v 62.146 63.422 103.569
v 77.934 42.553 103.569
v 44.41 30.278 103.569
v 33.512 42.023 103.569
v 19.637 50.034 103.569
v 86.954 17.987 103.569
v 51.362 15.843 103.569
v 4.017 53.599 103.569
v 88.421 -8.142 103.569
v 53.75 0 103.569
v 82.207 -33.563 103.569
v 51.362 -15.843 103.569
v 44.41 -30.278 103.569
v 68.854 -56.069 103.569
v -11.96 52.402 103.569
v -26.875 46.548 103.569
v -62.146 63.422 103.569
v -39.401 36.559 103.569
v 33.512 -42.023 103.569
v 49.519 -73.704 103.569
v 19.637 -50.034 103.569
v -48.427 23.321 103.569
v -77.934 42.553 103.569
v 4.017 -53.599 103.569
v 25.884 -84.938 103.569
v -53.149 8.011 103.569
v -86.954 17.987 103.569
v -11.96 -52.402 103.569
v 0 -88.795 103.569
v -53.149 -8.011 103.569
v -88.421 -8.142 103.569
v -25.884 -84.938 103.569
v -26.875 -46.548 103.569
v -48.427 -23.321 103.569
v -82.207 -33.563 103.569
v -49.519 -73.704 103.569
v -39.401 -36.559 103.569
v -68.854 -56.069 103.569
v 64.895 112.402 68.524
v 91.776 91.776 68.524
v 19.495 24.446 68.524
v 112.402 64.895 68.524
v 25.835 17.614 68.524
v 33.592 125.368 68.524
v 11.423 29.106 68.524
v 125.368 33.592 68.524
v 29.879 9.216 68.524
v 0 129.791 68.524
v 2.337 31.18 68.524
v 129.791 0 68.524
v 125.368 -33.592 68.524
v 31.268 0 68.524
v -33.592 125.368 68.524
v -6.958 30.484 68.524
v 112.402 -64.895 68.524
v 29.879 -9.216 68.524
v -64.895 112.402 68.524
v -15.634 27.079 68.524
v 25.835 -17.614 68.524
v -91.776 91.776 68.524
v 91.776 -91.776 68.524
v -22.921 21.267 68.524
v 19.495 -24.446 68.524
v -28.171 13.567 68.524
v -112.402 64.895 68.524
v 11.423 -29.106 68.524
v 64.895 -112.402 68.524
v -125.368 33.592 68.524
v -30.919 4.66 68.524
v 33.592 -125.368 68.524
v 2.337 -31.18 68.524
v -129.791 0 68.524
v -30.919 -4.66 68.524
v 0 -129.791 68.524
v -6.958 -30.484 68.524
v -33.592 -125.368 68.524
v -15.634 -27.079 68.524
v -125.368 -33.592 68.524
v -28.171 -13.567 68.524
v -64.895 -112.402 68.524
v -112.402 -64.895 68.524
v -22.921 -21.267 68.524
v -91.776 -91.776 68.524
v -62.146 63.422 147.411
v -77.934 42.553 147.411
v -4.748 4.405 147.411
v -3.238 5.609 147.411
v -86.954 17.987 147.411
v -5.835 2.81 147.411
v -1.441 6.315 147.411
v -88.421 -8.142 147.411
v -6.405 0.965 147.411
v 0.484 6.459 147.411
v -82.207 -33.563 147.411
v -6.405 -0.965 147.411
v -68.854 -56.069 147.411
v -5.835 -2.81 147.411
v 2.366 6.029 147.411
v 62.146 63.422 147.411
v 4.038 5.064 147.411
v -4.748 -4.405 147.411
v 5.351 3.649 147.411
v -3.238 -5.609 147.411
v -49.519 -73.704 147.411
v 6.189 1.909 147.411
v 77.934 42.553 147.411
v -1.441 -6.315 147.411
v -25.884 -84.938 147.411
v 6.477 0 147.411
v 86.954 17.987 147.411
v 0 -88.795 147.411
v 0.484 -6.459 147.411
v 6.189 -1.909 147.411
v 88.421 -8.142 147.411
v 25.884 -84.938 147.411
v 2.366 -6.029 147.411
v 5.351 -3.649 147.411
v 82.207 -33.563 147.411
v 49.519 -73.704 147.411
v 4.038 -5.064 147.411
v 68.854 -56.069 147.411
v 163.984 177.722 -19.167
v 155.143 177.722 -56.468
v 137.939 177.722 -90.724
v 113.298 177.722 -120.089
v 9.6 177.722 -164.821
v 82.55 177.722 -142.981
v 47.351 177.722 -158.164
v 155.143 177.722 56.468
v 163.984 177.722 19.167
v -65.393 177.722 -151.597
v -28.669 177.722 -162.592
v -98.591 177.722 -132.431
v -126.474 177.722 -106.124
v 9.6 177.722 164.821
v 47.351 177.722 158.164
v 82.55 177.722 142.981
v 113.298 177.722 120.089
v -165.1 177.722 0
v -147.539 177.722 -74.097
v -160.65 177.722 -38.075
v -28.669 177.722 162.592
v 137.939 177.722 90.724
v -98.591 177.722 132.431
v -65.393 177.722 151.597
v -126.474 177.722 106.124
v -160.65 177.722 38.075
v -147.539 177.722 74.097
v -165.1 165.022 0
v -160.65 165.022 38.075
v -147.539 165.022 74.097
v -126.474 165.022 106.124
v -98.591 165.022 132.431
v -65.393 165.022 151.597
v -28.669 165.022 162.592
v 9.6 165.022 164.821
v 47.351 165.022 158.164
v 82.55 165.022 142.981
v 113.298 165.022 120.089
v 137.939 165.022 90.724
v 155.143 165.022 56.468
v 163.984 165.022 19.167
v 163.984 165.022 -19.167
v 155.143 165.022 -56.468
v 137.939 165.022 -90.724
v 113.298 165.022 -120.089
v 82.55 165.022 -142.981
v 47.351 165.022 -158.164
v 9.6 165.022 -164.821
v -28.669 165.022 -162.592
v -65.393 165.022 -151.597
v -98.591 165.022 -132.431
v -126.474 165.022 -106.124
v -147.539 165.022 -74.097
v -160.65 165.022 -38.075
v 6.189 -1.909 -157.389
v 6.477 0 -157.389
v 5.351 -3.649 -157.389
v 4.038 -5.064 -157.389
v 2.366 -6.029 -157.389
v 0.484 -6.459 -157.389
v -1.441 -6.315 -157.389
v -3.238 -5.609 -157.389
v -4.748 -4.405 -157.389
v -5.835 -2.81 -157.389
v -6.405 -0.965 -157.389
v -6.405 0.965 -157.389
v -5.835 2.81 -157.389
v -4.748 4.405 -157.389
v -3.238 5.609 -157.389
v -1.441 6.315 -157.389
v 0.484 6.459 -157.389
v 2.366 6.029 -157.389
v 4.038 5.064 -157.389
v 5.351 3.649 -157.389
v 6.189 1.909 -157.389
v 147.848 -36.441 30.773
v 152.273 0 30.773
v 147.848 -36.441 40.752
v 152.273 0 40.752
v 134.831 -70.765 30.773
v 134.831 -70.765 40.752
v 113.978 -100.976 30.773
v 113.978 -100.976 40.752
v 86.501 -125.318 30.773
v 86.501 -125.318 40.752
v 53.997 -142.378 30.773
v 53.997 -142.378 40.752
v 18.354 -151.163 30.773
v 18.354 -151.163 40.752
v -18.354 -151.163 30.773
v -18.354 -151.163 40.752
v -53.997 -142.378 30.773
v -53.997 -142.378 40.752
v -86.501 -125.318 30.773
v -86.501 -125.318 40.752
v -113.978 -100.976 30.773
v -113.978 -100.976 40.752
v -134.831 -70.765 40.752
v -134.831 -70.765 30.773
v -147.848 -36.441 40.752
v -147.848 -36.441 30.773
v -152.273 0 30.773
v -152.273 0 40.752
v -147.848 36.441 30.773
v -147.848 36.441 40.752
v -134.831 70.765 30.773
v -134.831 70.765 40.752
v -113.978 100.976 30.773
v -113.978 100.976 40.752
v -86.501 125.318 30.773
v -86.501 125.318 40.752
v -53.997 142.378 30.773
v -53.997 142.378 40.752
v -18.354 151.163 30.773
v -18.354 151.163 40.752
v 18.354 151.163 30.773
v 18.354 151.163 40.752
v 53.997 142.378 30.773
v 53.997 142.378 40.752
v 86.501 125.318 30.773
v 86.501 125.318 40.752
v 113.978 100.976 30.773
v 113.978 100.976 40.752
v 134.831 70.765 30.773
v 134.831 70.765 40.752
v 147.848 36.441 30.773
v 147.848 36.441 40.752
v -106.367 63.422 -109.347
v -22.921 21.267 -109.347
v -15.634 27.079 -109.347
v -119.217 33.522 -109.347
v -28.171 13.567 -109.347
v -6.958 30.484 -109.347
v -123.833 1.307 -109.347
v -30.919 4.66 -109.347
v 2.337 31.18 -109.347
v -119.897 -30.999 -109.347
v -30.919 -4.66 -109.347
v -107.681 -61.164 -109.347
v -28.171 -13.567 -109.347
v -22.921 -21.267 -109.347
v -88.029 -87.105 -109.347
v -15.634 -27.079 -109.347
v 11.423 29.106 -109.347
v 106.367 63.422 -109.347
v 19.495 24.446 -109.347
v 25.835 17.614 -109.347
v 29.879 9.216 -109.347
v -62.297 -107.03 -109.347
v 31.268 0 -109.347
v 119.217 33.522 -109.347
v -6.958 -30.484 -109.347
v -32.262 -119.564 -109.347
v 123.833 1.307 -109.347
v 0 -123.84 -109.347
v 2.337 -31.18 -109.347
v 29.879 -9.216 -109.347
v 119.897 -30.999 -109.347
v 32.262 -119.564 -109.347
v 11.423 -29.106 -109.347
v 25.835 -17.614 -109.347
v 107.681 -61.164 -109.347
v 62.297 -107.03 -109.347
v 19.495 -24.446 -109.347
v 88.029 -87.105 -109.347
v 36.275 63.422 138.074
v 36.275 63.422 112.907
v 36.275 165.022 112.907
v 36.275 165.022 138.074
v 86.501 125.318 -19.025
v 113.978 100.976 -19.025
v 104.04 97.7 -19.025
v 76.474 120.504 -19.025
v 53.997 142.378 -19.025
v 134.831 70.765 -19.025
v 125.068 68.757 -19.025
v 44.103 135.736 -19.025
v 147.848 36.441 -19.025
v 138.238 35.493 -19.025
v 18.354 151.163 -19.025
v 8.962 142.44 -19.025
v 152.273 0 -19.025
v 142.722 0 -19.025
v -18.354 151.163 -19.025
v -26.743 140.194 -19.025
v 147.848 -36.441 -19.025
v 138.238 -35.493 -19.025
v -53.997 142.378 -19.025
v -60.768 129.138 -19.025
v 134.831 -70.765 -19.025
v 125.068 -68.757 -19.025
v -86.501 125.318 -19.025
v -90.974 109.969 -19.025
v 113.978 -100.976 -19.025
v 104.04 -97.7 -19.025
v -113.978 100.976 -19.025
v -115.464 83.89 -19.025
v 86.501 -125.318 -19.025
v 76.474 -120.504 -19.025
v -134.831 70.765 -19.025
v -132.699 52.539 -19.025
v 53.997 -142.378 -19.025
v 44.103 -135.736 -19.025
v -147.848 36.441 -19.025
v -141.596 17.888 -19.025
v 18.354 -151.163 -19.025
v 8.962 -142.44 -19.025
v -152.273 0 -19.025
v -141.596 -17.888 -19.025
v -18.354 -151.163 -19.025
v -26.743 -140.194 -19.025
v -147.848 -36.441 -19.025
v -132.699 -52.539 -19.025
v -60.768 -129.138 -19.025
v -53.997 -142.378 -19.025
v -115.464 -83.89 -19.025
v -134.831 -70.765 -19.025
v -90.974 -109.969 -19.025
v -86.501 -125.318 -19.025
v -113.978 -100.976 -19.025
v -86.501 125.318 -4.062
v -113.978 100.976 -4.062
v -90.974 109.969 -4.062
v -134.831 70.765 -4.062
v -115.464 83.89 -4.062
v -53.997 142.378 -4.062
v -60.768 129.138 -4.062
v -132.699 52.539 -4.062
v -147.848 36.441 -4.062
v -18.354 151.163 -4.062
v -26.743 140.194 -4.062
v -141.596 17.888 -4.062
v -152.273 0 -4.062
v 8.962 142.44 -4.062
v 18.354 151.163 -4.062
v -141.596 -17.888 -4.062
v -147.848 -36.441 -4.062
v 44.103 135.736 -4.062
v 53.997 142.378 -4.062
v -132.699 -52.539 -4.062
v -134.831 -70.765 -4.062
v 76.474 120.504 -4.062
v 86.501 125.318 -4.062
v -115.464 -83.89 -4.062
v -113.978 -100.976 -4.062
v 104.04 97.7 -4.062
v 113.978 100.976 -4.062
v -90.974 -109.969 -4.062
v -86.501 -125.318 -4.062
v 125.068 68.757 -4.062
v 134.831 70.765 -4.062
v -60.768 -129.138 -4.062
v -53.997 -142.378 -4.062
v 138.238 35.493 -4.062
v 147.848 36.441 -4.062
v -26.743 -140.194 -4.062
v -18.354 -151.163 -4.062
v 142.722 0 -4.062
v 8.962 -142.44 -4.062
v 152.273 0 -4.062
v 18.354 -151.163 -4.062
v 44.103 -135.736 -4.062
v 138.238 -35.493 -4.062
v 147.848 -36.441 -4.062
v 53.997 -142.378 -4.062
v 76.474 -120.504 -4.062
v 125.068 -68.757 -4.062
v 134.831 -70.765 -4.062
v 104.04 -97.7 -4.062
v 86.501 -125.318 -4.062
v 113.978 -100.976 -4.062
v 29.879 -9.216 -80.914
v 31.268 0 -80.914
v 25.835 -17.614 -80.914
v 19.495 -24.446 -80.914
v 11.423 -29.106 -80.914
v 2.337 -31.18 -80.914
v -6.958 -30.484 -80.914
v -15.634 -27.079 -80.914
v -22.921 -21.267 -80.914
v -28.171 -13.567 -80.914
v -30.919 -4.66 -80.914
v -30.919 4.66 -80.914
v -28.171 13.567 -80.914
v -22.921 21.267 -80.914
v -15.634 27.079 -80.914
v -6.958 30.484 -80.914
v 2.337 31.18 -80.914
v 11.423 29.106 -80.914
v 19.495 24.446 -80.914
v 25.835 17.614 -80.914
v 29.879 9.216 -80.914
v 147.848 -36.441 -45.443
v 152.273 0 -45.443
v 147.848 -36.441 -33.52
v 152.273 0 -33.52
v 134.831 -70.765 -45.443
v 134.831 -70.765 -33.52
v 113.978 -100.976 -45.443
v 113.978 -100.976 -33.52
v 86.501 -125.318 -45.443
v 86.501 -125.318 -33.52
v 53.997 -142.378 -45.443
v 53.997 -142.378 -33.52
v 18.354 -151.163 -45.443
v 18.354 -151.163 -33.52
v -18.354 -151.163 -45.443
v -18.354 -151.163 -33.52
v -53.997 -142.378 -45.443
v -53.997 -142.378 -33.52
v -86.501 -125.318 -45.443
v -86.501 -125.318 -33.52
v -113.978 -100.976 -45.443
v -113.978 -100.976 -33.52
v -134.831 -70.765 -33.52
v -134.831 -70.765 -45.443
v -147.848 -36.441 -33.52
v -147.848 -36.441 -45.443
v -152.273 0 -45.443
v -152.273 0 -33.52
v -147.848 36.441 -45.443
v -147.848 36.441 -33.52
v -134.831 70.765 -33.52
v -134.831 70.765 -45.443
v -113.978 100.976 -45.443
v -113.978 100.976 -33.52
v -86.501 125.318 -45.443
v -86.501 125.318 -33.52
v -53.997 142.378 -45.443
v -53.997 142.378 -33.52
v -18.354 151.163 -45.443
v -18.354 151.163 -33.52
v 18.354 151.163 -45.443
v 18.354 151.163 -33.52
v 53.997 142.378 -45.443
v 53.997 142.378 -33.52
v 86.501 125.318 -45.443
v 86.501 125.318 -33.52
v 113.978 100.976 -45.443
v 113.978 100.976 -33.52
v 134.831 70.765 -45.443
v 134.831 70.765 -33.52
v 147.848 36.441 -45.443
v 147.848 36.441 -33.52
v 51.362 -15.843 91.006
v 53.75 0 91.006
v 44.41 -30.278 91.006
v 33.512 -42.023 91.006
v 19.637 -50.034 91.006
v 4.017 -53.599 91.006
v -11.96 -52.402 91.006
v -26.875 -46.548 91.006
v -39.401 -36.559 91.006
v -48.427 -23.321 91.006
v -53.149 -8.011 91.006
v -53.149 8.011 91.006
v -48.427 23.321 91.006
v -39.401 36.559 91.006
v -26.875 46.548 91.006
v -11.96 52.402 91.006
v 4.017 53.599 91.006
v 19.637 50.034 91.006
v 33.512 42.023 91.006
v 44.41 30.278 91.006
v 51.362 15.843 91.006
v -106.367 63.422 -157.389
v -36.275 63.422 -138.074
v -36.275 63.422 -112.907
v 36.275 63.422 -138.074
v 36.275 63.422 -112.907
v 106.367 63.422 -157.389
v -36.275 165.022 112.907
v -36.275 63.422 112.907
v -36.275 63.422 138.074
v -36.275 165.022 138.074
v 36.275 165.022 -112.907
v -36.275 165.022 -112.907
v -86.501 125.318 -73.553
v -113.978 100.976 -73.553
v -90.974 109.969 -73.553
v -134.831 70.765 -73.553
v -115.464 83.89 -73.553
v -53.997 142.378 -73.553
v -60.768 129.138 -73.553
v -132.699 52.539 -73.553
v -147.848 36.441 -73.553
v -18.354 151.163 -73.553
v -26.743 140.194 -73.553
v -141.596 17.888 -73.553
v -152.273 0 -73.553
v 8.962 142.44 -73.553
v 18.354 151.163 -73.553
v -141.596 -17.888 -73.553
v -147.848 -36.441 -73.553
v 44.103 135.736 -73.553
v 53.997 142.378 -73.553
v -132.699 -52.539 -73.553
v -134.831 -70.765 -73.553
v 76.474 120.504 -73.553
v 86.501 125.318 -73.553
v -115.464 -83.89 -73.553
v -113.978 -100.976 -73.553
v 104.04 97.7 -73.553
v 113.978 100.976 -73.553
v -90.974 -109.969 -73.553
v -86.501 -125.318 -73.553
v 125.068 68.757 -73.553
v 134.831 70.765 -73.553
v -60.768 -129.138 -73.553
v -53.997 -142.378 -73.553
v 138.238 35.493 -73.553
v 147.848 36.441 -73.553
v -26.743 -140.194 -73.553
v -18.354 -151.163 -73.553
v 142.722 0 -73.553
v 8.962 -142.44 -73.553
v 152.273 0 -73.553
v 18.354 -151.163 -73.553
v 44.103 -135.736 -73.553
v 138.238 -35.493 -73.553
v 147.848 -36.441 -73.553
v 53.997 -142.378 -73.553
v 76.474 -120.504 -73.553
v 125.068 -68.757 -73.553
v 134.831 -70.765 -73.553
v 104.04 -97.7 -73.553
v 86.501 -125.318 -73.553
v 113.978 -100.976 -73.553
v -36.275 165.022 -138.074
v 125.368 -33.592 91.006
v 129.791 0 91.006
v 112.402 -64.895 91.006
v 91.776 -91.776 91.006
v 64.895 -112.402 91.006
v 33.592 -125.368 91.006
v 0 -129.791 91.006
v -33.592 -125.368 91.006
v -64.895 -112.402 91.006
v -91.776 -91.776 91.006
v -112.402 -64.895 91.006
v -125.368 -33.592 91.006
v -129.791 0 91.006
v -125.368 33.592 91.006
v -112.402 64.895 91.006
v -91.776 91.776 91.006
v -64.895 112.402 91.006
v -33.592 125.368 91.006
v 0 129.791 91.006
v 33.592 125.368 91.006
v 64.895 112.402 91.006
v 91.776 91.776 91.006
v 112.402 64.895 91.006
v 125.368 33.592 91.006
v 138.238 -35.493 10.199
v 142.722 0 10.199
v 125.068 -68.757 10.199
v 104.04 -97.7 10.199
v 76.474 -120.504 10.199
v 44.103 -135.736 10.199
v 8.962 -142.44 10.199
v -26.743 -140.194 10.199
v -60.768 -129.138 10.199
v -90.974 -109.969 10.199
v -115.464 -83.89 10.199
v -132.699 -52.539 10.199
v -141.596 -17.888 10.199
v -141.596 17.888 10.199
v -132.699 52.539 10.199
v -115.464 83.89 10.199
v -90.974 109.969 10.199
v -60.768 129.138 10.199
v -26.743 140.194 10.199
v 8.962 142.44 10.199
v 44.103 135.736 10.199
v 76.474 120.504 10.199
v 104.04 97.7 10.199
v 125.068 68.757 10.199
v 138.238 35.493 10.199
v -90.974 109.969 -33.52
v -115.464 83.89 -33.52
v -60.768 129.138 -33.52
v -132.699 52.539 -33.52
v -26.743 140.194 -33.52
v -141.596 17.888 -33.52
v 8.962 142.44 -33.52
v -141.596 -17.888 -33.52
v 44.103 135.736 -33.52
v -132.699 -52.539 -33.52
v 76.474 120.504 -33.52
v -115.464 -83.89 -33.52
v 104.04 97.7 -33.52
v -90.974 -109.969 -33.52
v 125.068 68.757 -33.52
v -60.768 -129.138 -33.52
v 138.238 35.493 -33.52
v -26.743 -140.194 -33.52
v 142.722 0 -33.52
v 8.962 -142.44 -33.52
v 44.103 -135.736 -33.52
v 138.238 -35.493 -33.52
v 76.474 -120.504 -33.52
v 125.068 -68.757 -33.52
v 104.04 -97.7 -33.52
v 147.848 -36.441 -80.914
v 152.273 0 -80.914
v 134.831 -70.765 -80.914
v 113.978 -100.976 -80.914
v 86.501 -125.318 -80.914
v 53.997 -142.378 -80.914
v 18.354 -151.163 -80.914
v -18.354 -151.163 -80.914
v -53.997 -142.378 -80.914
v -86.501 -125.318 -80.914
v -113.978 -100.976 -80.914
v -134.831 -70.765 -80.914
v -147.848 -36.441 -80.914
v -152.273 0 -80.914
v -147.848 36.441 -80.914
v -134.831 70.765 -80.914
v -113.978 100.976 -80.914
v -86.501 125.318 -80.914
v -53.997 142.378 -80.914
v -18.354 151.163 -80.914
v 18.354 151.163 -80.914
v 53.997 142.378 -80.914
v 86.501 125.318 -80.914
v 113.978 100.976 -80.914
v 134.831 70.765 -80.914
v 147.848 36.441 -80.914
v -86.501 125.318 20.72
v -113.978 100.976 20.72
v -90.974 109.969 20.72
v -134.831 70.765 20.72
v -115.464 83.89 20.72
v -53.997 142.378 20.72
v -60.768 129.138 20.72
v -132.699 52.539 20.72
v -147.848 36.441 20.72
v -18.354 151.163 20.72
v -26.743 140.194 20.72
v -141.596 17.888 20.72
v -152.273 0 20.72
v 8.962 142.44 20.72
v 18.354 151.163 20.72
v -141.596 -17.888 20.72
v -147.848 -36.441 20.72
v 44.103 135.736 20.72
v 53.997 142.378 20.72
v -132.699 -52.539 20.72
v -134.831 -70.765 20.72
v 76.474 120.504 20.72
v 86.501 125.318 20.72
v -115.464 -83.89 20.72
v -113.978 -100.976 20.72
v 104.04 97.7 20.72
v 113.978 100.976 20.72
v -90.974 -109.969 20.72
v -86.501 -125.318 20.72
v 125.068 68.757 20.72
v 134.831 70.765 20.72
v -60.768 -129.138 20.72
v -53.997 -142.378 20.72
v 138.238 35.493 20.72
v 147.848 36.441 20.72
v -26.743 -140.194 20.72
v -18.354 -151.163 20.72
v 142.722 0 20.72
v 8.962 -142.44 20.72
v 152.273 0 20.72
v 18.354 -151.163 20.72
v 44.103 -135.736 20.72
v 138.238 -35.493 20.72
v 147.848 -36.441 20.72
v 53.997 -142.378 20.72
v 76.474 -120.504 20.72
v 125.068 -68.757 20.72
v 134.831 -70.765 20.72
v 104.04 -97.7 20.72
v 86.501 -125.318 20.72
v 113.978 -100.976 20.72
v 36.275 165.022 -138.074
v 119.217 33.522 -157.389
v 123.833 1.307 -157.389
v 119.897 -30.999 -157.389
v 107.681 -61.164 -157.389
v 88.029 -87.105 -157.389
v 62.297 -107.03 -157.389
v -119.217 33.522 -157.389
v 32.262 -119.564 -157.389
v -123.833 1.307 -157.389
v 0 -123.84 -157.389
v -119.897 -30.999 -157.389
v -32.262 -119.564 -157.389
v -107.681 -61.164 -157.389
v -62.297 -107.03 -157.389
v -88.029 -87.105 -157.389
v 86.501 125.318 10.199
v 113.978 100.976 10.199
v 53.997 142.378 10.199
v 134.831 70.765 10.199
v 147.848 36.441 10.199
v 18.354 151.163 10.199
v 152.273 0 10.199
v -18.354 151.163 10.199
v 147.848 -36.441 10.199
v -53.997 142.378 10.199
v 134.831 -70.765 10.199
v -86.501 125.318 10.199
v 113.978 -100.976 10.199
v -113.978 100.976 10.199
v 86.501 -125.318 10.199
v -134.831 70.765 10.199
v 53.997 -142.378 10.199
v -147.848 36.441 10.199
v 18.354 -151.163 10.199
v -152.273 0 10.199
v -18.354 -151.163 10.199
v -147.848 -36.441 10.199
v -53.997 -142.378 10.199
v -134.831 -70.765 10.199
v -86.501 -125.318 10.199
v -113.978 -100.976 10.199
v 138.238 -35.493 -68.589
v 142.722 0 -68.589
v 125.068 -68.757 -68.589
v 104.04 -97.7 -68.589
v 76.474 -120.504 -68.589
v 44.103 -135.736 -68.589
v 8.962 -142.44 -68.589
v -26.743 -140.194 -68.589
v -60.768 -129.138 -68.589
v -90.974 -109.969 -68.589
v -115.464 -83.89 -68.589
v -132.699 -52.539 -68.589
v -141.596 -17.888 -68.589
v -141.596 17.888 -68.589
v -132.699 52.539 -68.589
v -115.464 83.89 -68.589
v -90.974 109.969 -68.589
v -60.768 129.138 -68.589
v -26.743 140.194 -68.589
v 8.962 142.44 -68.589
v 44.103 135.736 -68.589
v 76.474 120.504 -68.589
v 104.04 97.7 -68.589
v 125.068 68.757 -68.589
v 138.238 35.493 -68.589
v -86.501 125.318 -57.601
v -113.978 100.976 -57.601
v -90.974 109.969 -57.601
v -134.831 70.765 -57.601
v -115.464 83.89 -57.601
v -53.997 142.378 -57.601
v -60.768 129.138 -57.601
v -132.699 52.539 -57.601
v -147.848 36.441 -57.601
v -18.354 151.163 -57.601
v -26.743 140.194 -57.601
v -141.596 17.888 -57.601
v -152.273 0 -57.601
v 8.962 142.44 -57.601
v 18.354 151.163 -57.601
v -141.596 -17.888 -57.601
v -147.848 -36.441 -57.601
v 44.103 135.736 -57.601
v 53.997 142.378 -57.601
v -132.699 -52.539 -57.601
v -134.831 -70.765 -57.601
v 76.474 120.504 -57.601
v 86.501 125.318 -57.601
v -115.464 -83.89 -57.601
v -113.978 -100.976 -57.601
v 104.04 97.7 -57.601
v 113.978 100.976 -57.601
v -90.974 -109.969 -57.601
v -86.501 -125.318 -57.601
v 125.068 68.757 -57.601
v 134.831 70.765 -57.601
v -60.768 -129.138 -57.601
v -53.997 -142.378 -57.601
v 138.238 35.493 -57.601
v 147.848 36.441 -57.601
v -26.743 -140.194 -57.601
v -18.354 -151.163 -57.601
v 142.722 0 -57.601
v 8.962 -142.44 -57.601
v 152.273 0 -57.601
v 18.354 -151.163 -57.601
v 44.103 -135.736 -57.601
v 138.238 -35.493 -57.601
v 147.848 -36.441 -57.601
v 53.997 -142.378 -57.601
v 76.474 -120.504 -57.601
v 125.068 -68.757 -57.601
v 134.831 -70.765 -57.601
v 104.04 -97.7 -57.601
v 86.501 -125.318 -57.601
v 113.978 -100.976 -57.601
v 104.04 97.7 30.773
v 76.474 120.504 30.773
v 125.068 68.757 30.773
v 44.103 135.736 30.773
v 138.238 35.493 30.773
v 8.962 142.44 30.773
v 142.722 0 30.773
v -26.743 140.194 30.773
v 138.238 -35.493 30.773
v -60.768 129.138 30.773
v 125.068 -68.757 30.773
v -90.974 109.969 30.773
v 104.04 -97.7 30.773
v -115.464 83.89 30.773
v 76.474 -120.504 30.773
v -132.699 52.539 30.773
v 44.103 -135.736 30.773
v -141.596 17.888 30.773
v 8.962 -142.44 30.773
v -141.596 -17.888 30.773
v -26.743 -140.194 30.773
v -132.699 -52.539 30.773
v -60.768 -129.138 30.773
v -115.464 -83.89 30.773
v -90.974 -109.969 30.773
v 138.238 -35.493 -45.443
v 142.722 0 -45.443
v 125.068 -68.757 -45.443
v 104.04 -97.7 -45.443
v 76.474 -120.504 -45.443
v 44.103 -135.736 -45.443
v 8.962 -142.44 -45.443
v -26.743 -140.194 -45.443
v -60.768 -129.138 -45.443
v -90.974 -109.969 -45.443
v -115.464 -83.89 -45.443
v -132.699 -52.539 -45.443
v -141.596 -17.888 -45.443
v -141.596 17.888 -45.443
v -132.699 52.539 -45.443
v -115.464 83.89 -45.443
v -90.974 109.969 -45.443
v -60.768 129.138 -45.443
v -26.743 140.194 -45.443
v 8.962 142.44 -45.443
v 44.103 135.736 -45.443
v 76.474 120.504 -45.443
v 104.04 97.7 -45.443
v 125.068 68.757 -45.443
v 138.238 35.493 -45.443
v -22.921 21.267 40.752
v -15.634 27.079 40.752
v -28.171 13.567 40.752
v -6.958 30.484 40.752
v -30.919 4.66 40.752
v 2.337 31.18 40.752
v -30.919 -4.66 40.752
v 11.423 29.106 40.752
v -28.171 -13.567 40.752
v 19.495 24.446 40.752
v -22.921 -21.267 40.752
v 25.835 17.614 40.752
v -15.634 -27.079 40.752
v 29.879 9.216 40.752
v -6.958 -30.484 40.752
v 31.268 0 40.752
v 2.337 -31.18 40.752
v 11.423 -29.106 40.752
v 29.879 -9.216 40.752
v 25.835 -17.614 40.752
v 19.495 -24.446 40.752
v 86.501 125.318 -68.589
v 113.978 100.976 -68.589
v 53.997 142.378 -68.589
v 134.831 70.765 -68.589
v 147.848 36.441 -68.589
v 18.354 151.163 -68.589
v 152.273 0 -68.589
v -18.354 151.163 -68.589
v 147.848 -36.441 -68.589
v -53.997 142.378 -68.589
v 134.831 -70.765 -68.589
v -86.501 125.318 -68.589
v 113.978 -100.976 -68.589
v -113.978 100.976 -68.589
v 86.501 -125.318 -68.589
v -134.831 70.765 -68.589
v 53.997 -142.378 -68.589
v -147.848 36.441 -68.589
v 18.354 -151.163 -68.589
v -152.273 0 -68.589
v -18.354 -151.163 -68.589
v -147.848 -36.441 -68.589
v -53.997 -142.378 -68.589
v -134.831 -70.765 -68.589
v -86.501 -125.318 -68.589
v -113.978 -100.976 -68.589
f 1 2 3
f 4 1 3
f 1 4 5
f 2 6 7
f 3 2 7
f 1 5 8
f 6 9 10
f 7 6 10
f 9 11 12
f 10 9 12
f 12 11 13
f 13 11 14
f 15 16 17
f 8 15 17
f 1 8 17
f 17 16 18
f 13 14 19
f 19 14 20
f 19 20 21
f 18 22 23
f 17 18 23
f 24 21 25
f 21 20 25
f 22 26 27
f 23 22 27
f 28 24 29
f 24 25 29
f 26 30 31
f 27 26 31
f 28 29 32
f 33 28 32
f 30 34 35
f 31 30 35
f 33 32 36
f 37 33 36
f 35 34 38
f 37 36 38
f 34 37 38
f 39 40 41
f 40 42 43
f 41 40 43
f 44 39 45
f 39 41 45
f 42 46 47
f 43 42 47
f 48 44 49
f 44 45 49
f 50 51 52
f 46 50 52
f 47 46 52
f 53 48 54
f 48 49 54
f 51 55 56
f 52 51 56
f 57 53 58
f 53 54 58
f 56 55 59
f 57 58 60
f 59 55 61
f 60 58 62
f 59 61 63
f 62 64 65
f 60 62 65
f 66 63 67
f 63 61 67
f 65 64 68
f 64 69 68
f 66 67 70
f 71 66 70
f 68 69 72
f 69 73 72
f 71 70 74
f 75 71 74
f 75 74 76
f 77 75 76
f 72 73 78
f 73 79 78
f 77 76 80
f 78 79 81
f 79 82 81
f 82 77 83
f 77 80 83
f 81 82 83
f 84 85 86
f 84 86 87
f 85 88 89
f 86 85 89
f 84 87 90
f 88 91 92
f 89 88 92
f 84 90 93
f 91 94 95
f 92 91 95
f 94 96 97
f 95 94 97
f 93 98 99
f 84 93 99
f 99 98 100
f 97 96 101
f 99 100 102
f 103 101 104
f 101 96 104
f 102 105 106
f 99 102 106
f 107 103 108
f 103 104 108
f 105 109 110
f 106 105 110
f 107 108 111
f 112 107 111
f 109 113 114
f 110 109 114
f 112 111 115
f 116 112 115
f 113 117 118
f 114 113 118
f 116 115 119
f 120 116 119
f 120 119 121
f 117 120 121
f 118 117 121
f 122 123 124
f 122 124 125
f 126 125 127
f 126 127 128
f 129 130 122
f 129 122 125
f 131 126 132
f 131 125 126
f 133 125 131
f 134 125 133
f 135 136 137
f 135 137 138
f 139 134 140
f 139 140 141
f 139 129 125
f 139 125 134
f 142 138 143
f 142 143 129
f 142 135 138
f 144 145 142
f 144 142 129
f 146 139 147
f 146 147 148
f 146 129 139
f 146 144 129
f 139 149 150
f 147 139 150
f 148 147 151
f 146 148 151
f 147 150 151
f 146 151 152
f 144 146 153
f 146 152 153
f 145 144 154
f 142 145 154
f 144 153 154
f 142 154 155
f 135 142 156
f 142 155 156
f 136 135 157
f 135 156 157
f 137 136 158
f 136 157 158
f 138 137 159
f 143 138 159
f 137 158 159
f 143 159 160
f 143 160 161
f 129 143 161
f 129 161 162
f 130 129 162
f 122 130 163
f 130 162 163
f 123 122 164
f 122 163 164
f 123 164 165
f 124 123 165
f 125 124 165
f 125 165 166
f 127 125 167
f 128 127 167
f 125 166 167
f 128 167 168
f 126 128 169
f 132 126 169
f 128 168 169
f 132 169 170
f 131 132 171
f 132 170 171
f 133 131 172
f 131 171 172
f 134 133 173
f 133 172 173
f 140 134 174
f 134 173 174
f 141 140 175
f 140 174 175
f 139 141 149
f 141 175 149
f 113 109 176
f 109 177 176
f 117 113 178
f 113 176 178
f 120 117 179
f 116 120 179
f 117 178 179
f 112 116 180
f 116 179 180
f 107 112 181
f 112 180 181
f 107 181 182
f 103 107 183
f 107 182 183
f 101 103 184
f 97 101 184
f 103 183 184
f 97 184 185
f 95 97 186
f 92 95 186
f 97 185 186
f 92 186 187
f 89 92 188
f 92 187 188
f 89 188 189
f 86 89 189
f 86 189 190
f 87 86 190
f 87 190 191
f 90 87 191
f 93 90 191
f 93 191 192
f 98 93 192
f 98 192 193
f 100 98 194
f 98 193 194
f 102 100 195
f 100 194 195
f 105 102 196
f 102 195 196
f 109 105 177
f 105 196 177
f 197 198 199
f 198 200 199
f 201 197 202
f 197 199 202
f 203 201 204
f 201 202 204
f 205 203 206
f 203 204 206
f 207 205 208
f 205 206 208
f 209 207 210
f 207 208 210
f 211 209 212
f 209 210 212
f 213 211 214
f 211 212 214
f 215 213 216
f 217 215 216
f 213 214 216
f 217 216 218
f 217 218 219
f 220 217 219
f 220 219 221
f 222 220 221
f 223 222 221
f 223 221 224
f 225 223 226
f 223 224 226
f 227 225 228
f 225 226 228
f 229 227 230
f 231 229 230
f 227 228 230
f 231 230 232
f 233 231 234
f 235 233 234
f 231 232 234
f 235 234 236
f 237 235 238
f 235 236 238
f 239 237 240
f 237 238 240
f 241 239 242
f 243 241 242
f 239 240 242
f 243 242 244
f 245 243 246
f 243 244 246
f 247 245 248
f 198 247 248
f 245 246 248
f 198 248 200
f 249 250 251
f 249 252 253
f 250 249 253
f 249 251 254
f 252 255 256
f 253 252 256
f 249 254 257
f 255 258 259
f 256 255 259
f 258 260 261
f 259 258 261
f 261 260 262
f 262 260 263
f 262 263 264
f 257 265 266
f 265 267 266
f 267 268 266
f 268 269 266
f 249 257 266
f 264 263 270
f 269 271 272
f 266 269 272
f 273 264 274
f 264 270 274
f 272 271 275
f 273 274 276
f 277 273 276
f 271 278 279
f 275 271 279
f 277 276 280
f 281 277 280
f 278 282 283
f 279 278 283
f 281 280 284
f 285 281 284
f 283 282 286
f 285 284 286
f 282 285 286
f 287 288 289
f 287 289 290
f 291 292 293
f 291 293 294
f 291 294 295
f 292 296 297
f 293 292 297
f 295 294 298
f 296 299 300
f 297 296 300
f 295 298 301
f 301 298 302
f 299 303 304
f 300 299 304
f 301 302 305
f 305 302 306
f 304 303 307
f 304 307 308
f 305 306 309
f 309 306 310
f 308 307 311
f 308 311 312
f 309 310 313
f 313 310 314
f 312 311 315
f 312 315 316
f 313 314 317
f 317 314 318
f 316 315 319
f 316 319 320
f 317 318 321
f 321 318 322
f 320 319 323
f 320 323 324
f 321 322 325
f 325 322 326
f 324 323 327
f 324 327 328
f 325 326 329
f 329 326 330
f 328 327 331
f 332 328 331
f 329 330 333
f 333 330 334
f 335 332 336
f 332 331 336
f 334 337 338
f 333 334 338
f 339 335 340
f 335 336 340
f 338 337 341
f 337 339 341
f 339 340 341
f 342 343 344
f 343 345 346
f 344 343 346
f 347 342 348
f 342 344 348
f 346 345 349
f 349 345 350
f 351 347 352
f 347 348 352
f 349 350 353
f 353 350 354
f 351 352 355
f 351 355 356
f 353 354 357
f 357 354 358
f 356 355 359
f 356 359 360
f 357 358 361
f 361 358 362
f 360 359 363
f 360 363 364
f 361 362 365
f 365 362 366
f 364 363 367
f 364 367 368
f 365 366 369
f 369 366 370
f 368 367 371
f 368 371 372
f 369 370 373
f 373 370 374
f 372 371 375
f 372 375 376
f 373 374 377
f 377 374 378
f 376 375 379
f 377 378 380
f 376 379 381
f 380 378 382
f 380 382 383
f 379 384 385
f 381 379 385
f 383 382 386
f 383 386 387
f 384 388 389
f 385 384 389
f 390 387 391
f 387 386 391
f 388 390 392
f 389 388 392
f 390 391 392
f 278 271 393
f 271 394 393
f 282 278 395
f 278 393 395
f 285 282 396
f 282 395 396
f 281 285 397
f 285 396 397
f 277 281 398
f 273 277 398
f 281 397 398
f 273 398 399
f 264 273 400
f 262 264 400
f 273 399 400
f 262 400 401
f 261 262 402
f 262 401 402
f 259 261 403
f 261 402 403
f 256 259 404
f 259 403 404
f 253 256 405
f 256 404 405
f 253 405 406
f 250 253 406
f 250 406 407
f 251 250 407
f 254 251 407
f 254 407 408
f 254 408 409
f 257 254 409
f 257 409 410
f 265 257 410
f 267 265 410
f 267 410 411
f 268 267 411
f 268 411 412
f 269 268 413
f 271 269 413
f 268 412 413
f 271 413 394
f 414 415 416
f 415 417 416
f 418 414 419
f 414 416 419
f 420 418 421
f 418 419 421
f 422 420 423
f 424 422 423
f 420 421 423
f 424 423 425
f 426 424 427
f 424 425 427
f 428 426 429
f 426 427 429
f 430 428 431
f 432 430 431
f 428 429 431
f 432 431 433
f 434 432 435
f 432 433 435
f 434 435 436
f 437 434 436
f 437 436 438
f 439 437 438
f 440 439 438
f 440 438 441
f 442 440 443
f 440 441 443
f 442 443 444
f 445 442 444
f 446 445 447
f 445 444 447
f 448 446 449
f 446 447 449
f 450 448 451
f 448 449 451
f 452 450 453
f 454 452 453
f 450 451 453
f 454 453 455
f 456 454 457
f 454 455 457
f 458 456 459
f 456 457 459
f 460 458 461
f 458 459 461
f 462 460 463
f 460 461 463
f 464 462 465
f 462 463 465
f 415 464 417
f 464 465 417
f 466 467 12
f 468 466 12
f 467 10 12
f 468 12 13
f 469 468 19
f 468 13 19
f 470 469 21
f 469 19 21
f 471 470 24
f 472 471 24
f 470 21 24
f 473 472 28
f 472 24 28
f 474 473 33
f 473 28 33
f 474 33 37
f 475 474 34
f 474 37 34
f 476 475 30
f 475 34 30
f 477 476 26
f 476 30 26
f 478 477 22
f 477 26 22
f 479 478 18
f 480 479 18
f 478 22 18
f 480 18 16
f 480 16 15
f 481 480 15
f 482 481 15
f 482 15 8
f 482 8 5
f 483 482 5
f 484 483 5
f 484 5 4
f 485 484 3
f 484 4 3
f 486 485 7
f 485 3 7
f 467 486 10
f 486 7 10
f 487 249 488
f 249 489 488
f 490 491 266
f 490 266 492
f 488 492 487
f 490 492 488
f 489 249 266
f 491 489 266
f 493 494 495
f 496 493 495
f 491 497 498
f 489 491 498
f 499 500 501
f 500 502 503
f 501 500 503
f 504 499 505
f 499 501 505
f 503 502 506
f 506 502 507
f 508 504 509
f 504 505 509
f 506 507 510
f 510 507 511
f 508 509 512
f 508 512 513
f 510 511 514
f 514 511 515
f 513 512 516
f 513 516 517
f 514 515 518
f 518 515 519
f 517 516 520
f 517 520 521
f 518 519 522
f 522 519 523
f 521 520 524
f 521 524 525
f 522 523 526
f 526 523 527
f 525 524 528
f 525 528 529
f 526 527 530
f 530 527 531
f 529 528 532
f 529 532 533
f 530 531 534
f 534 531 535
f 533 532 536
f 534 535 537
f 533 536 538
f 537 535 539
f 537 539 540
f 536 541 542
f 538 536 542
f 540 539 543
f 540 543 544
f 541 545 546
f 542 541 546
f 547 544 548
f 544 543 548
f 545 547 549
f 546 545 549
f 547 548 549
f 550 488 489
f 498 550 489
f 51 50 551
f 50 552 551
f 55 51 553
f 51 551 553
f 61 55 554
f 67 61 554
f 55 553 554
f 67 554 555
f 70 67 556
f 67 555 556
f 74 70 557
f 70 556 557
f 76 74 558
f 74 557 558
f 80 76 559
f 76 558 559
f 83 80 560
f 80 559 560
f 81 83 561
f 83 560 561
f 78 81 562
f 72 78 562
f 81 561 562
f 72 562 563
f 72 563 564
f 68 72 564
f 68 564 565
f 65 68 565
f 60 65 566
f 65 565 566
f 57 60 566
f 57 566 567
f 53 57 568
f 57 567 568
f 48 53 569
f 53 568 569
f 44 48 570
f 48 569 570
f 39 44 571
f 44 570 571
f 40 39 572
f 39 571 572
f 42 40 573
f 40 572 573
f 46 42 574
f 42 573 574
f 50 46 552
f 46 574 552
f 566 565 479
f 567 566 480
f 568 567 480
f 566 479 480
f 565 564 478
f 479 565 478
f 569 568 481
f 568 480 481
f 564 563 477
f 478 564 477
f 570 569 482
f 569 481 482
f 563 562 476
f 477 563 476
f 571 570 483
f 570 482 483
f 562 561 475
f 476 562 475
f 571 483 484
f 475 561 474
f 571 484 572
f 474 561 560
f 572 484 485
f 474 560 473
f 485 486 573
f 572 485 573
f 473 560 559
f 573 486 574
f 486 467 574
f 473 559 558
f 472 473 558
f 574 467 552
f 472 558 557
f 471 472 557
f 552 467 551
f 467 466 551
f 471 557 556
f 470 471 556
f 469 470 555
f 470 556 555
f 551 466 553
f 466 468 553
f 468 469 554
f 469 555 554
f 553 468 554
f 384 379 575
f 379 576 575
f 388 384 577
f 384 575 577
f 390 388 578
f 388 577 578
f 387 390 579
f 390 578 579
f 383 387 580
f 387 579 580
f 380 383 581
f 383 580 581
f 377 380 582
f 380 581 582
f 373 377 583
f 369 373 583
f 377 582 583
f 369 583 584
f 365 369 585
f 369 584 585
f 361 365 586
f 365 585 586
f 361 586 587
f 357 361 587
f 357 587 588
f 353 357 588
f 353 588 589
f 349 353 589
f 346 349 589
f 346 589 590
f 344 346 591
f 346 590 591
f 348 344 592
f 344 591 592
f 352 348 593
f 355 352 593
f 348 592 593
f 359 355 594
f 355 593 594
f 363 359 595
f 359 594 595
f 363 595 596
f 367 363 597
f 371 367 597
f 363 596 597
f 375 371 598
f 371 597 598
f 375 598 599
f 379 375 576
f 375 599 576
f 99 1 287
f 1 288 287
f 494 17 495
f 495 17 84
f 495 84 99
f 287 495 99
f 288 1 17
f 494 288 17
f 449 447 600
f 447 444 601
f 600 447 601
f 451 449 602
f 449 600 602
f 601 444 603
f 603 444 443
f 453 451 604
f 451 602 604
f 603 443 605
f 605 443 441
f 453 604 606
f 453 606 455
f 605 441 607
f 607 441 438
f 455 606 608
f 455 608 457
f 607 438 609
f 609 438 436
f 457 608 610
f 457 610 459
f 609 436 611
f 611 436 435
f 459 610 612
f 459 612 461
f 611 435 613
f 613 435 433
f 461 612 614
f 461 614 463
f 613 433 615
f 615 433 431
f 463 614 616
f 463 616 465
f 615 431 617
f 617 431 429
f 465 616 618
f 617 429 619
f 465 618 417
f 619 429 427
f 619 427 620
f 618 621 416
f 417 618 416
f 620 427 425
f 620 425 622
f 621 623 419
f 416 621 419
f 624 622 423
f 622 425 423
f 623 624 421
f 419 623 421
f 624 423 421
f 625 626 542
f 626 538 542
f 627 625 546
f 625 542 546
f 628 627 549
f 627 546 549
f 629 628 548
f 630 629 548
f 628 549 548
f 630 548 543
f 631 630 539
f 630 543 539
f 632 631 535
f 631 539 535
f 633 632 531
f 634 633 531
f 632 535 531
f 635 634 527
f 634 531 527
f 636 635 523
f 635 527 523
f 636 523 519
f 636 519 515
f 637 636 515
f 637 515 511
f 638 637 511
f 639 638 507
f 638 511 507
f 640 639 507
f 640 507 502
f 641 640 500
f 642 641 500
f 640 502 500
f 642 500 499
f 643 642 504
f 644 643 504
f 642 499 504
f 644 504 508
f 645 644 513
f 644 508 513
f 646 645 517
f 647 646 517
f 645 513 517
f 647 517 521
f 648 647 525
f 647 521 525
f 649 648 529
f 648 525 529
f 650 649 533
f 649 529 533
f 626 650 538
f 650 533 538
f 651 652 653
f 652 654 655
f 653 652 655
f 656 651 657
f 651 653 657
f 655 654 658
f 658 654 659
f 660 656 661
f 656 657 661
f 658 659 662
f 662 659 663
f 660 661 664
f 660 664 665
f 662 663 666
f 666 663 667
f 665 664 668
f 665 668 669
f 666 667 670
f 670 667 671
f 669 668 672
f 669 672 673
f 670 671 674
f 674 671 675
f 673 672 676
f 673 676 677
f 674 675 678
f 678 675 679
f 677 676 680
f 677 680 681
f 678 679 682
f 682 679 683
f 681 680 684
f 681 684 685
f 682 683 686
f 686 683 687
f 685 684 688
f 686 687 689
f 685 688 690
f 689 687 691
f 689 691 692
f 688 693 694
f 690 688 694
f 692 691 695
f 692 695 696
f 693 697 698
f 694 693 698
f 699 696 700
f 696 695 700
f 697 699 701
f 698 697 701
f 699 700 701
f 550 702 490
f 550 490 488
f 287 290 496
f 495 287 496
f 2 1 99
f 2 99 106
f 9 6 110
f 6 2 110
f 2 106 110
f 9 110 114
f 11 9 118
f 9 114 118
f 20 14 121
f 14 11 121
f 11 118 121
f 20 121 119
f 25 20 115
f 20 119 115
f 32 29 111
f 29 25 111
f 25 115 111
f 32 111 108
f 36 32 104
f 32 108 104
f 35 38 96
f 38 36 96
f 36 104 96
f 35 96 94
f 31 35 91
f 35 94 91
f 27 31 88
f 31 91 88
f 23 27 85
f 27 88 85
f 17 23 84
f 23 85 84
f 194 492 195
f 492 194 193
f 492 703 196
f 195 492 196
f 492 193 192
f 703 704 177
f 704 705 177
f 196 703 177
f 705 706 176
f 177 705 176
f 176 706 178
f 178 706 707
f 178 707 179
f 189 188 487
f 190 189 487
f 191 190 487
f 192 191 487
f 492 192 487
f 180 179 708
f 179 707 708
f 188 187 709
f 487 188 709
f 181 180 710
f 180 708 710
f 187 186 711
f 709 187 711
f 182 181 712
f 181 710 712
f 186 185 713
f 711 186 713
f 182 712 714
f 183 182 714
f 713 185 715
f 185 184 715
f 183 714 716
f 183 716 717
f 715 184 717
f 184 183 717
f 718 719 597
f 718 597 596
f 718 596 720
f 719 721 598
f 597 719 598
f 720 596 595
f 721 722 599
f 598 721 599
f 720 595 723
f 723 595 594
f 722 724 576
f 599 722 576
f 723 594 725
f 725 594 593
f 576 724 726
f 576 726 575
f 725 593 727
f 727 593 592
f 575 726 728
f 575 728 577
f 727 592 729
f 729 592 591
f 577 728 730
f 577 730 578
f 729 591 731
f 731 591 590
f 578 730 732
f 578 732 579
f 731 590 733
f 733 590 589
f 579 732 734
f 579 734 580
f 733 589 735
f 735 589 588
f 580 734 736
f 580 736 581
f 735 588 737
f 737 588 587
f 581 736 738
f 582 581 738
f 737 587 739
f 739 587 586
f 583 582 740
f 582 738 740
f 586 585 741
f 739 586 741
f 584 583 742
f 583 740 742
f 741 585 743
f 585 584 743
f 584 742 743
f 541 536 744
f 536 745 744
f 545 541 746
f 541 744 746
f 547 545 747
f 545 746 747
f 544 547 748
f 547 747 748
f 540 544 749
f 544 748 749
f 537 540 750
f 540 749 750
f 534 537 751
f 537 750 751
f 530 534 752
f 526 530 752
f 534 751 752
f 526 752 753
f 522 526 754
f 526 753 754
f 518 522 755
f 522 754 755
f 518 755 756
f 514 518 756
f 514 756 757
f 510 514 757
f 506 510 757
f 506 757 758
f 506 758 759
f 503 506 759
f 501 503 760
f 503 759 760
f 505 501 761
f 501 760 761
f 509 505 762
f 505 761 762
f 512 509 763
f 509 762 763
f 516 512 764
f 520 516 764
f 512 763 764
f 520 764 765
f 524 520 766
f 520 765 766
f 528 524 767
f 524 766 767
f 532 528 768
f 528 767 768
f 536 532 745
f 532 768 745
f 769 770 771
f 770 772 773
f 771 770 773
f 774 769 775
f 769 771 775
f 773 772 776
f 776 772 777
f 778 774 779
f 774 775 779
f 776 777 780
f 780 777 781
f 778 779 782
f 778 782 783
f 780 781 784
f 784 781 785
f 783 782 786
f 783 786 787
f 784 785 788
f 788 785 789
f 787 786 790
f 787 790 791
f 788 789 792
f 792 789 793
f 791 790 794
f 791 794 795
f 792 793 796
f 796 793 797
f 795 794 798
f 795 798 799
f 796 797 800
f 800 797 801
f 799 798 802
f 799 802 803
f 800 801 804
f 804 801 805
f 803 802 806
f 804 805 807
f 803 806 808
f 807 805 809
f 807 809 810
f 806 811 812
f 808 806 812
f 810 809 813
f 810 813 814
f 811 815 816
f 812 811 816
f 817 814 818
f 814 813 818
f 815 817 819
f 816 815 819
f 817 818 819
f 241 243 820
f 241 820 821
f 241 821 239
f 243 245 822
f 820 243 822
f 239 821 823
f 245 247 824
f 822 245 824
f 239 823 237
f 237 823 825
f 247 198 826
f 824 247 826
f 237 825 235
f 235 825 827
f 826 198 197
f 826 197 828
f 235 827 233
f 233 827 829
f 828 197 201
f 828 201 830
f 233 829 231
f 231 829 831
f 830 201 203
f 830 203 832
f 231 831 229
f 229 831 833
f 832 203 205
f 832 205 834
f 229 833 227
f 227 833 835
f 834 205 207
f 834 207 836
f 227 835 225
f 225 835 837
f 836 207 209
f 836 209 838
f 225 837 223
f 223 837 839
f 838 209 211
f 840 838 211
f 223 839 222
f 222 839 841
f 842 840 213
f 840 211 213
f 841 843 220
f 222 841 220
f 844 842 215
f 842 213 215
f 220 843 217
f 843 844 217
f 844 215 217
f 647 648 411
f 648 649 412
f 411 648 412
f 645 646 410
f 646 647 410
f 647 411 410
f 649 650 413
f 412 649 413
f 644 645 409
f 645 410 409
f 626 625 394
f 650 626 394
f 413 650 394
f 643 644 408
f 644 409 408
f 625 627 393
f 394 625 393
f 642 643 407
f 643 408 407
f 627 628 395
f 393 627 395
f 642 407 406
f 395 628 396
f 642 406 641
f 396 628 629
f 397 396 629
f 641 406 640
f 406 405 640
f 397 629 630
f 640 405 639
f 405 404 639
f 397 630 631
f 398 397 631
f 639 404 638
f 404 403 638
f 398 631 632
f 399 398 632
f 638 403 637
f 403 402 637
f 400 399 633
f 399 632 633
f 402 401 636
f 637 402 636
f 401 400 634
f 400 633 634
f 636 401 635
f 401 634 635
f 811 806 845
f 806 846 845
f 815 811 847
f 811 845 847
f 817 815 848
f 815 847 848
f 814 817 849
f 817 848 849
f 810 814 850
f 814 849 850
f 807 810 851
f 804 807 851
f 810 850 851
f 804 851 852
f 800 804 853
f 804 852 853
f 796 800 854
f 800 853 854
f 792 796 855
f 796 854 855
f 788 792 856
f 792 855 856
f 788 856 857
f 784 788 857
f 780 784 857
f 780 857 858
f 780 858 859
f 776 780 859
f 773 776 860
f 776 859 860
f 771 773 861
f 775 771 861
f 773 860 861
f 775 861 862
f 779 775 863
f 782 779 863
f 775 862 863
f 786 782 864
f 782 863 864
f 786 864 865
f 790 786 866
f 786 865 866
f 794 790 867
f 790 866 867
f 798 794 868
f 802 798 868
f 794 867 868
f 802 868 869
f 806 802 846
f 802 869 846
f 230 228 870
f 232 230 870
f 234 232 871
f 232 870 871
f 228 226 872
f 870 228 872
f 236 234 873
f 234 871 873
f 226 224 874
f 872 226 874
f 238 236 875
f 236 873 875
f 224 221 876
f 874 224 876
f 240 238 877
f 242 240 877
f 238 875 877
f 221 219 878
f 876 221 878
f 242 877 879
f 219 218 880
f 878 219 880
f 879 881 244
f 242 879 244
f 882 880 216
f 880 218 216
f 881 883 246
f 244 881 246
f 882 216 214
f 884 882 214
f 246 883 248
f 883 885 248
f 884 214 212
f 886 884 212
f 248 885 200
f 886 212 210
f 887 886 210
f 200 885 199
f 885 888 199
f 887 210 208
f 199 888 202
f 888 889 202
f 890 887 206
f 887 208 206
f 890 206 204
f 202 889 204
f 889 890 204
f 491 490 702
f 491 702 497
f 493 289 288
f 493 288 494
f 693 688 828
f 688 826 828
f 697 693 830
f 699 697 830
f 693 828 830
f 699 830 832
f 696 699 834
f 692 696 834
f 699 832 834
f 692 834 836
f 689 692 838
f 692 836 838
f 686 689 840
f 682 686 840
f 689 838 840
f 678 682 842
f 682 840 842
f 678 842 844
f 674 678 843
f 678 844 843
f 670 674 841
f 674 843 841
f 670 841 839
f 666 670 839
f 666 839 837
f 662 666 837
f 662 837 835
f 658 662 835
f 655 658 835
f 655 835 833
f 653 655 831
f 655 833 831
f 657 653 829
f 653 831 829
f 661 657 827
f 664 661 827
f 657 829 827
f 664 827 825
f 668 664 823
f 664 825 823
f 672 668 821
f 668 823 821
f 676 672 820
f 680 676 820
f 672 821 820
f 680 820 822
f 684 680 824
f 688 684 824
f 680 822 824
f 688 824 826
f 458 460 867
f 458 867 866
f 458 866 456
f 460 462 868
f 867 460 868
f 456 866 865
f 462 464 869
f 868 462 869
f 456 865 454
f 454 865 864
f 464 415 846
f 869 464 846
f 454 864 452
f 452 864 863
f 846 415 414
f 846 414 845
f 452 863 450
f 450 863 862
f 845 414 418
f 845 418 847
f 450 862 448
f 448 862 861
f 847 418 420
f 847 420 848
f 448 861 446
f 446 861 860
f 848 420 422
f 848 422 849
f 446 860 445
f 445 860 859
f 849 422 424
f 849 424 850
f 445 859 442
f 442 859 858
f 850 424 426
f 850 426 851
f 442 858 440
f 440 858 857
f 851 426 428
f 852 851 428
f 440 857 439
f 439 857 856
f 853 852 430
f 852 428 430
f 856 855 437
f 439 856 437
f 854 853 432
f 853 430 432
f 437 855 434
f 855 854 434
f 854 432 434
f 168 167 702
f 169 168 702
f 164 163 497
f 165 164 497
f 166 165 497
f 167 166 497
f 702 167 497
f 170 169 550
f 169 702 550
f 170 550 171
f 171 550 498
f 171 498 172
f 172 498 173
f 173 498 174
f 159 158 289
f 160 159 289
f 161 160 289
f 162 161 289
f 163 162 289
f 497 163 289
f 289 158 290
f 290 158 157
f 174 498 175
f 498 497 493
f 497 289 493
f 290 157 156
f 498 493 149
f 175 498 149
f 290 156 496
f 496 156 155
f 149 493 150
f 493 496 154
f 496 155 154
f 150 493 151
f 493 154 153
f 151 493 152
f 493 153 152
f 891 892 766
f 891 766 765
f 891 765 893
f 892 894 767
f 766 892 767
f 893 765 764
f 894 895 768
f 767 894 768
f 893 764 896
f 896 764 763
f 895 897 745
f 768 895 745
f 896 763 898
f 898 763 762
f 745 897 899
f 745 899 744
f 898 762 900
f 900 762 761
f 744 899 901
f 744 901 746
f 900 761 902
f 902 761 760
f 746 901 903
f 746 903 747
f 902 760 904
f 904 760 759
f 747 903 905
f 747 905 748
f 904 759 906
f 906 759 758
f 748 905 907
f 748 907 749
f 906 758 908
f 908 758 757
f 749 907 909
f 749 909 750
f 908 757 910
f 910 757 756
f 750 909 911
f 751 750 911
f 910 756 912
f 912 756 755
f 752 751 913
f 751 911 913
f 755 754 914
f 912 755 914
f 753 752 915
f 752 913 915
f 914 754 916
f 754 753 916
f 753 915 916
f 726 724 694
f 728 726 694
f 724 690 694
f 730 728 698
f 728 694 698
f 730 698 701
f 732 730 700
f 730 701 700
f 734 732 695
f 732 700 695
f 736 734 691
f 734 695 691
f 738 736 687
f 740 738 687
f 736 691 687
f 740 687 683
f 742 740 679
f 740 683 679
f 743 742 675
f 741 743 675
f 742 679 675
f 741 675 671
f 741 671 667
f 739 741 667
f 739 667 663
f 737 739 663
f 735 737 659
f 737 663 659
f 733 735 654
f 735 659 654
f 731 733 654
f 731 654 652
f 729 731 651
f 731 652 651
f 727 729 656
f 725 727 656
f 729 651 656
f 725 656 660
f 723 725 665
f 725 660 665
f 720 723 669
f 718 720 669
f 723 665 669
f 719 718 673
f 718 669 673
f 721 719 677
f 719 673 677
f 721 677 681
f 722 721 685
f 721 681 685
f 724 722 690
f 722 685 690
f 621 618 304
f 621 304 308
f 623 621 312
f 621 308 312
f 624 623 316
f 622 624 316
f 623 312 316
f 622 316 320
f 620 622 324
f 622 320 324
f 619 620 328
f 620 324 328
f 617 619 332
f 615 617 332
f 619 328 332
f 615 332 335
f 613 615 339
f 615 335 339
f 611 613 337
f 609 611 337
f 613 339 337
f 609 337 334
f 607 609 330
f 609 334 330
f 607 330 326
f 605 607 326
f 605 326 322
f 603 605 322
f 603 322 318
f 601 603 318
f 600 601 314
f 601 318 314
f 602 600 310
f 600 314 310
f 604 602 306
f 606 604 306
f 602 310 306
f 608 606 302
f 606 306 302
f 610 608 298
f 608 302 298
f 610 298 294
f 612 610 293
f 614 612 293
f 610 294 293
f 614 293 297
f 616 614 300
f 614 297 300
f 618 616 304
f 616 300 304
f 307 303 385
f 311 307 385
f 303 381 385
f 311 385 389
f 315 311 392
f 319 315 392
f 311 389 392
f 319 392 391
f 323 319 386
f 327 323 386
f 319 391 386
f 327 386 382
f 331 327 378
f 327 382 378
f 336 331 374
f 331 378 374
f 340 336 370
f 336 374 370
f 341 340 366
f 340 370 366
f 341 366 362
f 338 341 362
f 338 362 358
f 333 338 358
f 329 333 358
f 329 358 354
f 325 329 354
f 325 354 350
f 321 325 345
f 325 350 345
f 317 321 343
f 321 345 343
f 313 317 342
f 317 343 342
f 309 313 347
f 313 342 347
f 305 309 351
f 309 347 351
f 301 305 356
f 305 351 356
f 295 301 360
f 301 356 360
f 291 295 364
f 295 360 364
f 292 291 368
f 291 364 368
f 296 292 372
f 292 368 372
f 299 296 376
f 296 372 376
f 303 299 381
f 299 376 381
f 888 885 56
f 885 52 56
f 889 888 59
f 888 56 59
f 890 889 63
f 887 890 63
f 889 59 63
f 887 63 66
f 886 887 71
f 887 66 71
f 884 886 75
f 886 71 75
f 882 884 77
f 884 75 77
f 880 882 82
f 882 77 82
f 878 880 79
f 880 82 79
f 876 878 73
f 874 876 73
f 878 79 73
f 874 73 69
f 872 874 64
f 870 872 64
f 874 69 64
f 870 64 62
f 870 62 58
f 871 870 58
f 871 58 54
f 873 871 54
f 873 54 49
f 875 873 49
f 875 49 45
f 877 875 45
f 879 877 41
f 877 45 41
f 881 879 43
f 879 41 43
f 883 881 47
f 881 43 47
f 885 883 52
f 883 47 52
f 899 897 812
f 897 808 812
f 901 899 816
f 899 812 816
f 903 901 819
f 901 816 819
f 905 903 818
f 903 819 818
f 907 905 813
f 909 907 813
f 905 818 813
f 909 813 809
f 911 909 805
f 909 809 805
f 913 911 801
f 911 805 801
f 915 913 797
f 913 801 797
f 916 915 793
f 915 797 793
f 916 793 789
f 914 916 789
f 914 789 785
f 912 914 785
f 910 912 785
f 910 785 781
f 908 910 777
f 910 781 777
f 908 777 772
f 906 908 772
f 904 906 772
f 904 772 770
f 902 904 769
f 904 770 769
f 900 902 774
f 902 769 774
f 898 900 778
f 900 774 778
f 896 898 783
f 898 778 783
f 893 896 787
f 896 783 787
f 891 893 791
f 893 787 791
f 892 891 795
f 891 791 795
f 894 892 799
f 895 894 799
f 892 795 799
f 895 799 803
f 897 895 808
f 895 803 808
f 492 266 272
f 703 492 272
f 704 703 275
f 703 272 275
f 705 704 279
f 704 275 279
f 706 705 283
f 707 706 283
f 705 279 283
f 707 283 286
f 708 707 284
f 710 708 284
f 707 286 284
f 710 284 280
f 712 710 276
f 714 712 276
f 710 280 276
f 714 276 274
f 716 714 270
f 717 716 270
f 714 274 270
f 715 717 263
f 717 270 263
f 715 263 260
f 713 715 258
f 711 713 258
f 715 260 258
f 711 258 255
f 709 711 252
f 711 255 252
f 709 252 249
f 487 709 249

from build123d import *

# Parameters (mm, degrees)
F2_W     = 95.933378
F2_H     = 103.010424
F3_DEPTH = 127
F4_W     = 72.550886
F4_H     = 25.166716
F5_DEPTH = 101.6
F6_R     = 165.1
F7_DEPTH = 12.7


with BuildPart() as f1:
    # F0 (on Front) → F1 (revolve)
    with BuildSketch(Plane.XZ):
        Polygon((88.794723, 147.411454), (6.476902, 147.411454), (6.476902, -157.388546), (123.8399, -157.388546), (123.8399, -109.347023), (31.267736, -109.347023), (31.267736, -80.914147), (152.272776, -80.914147), (152.272776, -73.552802), (142.721742, -73.552802), (142.721742, -68.588875), (152.272776, -68.588875), (152.272776, -57.600658), (142.721742, -57.600658), (142.721742, -45.443479), (152.272776, -45.443479), (152.272776, -33.520091), (142.721742, -33.520091), (142.721742, -19.024992), (152.272776, -19.024992), (152.272776, -4.062309), (142.721742, -4.062309), (142.721742, 10.198998), (152.272776, 10.198998), (152.272776, 20.719634), (142.721742, 20.719634), (142.721742, 30.772688), (152.272776, 30.772688), (152.272776, 40.75212), (31.267736, 40.75212), (31.267736, 68.523772), (129.790947, 68.523772), (129.790947, 91.005571), (53.749543, 91.005571), (53.749543, 103.568949), (88.794723, 103.568949), align=None)
    revolve(axis=Axis((0, 0, -4.988546), (0, 0, -1)))

    # F2 (on Right) → F3 (cut, symmetric)
    with BuildSketch(Plane.YZ):
        with Locations((111.389175, 147.290256)):
            Rectangle(F2_W, F2_H)
        Polygon((159.355864, -96.834429), (63.422486, -96.834429), (63.422486, -198.305756), (159.355864, -196.701795), align=None)
    extrude(amount=F3_DEPTH, both=True, mode=Mode.SUBTRACT)

    # F4 (on face) → F5 (join)
    with BuildSketch(Plane(origin=(0, 63.422486, 0), x_dir=(-1, 0, 0), z_dir=(0, 1, 0))):
        with Locations((0, 125.490201)):
            Rectangle(F4_W, F4_H)
        with Locations((0, -125.490201)):
            Rectangle(F4_W, F4_H)
    extrude(amount=F5_DEPTH)

    # F6 (on face) → F7 (join)
    with BuildSketch(Plane(origin=(0, 165.022486, 0), x_dir=(-1, 0, 0), z_dir=(0, 1, 0))):
        Circle(F6_R)
    extrude(amount=F7_DEPTH)


solid = f1.part
